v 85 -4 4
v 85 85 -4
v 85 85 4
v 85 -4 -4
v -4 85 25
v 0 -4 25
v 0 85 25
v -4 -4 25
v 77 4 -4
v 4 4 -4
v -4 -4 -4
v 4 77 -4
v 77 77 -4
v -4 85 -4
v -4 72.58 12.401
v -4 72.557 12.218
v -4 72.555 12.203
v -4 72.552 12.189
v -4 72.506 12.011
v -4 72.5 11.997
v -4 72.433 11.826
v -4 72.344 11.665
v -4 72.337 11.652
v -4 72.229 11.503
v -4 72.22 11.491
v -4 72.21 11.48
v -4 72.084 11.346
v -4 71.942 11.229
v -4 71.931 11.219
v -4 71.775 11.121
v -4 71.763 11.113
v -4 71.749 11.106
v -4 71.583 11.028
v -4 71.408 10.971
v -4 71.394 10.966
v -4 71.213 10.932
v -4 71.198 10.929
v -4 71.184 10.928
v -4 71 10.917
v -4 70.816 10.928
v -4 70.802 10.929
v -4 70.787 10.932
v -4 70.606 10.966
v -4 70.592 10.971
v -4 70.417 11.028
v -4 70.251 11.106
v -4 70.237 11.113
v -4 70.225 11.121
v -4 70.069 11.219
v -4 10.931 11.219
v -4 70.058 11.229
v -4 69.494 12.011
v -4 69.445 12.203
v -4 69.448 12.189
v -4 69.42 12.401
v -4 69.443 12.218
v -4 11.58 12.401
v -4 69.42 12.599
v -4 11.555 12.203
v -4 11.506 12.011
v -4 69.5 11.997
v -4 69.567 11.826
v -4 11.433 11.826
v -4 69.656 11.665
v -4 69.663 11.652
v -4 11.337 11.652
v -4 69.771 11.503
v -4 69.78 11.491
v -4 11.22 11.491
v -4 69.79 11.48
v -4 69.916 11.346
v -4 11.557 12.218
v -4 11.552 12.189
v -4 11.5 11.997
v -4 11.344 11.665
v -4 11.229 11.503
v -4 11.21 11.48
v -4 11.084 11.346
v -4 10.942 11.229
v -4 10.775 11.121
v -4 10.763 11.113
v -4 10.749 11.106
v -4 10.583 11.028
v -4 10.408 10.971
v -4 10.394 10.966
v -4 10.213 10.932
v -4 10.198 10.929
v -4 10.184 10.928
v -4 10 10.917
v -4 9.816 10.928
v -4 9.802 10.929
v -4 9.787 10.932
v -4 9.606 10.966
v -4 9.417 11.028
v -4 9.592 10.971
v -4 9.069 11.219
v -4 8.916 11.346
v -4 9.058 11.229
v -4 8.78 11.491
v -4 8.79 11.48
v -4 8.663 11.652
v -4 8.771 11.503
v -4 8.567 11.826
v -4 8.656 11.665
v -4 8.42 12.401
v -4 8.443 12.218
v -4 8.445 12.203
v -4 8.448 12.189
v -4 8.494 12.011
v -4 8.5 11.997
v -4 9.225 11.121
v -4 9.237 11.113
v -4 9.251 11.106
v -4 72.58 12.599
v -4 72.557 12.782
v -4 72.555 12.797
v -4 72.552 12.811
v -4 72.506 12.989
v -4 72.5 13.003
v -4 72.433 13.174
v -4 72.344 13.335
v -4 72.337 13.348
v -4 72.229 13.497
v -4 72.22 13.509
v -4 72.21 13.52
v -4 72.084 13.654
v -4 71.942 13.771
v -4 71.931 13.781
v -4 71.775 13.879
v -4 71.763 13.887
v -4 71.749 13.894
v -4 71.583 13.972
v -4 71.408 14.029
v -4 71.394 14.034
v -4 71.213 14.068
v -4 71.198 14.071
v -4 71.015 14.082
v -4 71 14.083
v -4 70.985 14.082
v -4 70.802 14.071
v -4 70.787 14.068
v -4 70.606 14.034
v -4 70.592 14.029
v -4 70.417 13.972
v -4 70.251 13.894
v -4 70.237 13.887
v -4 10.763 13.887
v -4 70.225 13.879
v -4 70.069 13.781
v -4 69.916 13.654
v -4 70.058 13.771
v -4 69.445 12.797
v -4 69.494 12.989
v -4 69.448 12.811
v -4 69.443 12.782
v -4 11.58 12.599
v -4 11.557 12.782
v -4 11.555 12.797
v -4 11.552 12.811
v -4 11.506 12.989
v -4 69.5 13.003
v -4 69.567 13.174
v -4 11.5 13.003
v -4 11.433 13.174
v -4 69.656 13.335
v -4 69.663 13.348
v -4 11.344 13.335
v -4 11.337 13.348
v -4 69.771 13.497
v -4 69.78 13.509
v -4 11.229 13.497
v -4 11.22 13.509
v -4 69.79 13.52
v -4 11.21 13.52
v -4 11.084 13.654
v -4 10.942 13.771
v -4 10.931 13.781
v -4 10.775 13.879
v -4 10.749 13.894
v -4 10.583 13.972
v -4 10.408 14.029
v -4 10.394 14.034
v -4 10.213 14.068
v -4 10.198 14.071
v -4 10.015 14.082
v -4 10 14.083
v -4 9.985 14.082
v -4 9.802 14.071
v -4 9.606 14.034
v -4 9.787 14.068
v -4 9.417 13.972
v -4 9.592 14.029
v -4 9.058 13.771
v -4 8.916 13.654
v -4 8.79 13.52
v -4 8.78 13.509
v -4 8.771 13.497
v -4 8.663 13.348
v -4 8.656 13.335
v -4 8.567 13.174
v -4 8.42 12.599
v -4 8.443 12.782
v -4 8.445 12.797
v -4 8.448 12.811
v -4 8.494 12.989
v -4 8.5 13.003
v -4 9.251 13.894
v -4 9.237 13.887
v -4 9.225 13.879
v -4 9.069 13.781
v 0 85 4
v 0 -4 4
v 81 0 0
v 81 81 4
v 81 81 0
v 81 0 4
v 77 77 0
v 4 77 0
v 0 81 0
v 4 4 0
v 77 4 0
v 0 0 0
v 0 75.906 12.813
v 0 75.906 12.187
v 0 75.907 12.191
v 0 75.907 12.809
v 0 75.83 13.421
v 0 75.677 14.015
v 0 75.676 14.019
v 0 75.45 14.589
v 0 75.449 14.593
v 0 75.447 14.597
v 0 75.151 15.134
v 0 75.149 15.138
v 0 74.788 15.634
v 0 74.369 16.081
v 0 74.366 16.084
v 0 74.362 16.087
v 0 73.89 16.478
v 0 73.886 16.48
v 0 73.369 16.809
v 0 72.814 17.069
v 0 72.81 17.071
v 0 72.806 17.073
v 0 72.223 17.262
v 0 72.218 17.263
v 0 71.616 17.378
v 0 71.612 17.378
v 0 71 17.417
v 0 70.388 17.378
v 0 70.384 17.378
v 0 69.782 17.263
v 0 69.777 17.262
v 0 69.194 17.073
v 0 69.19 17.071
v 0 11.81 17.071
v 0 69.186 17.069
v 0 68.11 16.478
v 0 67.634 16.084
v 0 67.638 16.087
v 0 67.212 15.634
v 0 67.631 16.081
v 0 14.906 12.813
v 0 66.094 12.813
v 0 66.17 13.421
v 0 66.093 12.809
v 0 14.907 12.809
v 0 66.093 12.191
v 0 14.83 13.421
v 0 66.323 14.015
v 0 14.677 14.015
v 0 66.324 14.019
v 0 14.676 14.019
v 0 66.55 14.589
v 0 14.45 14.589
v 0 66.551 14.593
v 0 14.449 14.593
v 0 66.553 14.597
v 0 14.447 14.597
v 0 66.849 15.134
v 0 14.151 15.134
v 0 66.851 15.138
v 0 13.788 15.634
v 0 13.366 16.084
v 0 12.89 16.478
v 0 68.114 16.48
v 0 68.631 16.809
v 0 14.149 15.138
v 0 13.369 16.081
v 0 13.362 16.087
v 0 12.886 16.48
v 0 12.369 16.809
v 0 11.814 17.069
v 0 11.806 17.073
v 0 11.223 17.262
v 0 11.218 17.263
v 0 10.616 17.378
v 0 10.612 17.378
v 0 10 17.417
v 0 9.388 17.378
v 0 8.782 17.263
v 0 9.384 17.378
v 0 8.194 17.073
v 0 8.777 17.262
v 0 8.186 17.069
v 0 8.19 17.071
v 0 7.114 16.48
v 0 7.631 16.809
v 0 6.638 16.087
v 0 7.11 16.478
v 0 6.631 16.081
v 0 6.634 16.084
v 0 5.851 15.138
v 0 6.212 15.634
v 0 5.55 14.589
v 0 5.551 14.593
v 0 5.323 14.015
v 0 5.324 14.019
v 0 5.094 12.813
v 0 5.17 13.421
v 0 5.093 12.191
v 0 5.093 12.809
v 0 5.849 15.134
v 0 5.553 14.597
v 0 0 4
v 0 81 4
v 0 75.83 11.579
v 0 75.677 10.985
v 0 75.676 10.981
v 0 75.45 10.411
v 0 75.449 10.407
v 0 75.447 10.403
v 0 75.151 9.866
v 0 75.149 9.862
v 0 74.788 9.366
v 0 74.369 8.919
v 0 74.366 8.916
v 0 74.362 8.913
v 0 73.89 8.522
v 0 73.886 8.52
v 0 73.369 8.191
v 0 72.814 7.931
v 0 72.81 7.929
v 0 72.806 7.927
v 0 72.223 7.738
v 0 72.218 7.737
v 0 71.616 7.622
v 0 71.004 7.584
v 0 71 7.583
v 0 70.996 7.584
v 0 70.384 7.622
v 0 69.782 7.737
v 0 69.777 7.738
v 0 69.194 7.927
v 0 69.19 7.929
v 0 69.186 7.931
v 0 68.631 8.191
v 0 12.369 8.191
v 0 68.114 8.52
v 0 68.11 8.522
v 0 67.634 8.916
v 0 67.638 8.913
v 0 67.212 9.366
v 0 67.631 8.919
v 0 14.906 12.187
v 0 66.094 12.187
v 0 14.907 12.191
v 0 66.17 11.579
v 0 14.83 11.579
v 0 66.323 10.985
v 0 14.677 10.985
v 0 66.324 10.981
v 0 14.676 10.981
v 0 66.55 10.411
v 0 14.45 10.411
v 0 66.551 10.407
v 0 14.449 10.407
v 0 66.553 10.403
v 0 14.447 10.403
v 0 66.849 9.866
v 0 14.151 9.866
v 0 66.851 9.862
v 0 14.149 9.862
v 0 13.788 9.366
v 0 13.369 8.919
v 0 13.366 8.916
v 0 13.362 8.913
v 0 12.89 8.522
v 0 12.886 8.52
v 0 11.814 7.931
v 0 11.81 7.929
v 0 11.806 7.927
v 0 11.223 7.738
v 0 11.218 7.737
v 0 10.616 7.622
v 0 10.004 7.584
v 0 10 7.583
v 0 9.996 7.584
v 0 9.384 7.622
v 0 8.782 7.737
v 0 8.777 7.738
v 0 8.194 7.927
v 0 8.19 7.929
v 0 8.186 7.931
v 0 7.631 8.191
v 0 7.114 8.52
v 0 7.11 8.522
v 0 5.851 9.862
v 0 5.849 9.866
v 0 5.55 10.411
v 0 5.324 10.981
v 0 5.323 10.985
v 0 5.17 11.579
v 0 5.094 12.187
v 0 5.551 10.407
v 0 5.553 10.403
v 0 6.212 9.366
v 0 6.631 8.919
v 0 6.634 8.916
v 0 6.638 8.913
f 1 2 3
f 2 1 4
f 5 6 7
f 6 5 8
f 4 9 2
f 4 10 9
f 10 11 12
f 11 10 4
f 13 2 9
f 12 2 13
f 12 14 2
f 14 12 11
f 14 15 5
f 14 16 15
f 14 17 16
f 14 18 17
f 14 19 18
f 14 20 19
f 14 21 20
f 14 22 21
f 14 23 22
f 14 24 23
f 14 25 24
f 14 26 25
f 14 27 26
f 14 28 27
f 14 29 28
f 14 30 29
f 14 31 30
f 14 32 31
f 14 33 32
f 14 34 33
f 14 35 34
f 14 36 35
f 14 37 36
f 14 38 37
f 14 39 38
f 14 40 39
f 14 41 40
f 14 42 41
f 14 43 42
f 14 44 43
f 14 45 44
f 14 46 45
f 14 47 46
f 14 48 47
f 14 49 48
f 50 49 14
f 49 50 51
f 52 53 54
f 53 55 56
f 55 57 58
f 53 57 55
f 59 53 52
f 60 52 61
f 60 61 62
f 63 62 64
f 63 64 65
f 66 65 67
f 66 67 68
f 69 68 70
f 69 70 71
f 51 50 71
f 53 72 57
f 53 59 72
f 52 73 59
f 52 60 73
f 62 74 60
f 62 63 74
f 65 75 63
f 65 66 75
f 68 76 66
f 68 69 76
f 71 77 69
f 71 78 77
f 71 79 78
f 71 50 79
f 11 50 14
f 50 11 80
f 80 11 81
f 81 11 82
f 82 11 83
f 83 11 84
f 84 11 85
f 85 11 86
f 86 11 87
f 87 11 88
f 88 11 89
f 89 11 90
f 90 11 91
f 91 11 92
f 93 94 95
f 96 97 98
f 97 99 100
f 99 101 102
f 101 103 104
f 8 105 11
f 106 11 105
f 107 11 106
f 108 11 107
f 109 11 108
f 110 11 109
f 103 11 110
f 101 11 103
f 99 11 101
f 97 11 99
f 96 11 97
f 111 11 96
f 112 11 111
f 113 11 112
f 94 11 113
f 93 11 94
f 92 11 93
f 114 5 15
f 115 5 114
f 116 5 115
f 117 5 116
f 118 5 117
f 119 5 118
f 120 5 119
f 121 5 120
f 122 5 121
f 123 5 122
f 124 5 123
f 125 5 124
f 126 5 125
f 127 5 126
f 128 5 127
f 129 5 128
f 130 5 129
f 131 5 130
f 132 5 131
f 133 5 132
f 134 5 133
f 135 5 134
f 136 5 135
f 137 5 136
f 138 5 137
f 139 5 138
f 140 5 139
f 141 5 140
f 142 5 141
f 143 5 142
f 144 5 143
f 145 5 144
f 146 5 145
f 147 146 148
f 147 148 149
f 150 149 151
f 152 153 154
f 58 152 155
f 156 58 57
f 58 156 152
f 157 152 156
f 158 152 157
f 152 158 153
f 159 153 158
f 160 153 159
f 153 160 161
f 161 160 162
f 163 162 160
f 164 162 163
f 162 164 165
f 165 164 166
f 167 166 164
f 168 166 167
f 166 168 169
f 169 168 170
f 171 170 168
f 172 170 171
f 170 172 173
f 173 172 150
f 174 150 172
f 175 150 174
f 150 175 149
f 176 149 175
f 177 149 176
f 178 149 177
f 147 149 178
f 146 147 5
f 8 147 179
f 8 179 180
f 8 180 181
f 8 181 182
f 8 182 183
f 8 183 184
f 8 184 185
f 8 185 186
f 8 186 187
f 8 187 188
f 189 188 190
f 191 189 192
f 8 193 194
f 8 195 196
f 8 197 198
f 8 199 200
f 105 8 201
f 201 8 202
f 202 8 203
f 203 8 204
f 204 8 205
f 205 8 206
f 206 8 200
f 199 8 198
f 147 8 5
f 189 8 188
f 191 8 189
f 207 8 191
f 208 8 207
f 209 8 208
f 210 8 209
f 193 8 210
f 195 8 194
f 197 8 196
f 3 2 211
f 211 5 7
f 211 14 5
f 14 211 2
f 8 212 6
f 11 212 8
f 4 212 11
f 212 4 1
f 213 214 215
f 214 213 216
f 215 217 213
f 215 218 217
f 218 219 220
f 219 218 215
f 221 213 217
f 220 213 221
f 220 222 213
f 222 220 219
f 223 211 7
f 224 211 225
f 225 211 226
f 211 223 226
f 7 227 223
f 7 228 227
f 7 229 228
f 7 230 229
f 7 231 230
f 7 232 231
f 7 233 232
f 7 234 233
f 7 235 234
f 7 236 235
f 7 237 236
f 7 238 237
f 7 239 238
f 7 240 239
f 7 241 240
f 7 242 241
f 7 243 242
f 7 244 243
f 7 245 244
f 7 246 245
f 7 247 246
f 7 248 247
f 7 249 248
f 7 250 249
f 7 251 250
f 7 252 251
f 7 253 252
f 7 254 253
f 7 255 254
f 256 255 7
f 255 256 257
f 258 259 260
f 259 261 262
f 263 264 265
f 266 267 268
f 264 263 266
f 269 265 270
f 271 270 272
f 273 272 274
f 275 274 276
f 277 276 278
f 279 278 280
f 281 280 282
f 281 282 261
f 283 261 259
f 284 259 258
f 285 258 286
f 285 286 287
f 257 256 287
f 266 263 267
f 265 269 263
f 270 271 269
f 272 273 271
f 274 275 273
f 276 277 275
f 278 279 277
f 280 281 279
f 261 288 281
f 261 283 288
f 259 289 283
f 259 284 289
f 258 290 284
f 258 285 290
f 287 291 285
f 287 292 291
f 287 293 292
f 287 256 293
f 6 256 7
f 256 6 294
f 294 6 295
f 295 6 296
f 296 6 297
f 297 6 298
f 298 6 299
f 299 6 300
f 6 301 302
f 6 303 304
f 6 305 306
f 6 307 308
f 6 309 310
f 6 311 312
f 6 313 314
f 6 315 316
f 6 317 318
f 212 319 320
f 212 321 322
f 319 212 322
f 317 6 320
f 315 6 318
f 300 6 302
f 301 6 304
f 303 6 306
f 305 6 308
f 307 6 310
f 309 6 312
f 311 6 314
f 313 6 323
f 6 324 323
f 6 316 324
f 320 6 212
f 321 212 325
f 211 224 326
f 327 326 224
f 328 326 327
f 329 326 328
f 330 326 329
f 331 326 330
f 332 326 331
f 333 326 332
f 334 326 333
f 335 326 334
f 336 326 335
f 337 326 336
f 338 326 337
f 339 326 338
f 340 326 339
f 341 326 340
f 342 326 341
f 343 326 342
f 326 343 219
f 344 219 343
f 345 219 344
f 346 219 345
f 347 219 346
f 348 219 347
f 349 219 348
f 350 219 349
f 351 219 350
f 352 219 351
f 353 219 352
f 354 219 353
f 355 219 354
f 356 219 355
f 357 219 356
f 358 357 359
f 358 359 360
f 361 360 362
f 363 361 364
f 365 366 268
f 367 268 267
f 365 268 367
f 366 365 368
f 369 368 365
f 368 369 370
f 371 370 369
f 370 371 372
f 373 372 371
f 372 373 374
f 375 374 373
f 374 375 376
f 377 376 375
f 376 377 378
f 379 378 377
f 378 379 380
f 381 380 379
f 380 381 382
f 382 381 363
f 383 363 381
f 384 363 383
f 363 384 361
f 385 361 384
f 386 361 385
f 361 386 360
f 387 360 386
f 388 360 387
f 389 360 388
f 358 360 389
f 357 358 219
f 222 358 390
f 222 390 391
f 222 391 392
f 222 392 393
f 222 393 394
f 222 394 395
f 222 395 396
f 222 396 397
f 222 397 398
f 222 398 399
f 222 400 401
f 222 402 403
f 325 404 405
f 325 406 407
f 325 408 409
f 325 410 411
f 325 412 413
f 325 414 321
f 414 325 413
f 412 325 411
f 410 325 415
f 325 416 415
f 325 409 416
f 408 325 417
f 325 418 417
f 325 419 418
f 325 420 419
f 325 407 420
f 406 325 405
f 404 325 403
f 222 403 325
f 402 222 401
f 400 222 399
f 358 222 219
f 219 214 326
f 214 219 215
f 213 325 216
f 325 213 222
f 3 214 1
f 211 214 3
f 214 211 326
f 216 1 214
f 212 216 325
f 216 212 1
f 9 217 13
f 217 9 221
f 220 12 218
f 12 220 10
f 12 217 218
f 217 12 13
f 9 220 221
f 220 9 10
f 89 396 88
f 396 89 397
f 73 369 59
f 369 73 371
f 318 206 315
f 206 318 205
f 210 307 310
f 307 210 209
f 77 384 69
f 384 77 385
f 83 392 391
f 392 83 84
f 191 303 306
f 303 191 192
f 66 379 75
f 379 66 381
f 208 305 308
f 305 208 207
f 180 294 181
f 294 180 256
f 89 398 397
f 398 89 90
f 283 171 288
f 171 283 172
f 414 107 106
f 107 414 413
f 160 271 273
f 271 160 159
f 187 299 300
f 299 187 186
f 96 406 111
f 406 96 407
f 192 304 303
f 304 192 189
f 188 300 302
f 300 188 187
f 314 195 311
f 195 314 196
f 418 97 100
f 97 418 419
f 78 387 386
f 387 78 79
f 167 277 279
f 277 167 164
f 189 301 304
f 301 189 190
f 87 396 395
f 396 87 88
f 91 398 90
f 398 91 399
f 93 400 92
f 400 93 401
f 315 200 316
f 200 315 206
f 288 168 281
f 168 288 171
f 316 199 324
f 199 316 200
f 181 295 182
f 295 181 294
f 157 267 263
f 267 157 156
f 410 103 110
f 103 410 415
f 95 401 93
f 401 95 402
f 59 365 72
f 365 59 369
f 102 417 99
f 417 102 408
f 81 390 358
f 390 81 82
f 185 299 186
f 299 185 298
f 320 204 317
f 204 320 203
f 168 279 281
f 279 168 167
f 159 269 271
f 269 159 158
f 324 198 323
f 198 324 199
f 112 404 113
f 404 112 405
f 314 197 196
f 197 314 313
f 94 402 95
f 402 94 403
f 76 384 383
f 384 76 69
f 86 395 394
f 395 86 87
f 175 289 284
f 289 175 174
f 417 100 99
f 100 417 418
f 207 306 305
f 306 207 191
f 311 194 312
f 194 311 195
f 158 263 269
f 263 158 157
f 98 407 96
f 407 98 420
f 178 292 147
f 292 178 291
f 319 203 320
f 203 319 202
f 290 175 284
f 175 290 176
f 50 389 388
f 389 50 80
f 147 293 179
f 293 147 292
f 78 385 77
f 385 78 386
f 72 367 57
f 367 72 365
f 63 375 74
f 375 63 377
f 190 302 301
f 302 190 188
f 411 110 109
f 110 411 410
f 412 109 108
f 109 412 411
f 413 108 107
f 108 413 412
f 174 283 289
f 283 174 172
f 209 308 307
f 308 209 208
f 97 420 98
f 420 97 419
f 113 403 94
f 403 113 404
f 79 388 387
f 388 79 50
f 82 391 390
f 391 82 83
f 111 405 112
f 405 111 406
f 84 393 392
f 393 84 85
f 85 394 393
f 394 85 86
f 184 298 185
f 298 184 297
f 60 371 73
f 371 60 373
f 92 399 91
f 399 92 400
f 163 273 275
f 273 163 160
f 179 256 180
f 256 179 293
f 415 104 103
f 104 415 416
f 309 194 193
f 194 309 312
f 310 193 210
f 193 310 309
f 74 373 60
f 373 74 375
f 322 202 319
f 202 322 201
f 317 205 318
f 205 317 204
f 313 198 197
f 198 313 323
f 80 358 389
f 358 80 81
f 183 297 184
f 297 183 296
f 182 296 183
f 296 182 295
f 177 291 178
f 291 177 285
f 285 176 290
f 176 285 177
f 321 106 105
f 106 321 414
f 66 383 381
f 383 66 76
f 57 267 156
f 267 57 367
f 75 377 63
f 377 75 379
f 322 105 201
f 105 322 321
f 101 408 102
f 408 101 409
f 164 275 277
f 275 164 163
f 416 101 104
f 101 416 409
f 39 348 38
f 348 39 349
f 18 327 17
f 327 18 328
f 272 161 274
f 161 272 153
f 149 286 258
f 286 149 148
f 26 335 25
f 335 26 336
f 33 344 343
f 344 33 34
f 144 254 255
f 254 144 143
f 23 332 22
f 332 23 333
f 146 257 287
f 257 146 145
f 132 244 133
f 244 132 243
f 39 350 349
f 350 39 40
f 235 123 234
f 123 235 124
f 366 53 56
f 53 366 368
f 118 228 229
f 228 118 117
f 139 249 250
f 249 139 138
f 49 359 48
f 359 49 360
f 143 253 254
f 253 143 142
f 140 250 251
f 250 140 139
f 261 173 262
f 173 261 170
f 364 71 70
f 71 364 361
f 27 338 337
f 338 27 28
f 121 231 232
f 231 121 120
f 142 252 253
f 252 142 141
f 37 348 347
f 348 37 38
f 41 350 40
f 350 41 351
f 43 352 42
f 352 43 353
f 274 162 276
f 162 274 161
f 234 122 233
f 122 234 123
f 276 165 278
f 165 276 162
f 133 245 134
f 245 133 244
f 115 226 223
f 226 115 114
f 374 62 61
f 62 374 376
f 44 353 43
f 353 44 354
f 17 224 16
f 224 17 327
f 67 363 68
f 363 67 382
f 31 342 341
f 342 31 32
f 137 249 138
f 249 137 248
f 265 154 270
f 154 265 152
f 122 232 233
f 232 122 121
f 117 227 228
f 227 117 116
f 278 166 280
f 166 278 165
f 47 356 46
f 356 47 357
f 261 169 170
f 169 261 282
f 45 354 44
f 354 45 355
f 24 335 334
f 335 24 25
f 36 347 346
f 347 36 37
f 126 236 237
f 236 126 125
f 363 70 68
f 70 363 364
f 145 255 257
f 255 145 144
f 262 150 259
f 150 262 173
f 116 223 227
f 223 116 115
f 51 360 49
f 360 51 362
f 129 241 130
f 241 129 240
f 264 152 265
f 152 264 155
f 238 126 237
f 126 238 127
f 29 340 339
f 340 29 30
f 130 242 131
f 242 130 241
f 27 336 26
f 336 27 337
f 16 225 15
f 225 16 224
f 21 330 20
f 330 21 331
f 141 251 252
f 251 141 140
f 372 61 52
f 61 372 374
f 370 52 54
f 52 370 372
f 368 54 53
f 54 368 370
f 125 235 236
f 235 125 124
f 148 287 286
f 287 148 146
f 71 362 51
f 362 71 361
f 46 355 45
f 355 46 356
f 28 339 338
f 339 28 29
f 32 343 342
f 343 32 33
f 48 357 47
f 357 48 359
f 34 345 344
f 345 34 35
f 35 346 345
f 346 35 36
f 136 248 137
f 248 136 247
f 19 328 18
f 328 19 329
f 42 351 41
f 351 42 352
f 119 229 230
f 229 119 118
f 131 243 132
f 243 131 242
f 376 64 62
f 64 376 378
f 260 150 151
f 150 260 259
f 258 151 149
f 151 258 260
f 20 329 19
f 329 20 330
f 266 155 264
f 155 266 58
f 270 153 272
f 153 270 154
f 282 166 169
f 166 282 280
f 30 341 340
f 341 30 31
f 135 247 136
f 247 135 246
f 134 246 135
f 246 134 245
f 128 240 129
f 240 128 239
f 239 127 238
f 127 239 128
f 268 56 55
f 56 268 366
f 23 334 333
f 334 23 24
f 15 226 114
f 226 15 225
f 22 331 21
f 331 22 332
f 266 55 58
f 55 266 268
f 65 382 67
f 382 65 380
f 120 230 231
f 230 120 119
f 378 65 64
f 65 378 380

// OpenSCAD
$width = 81;
$height = 25;
$depth = 81;
$border = 4;

$fn = 50;

difference() {
    translate([-$border,-$border,-$border]) cube([$depth+$border*2,$depth+$border*2,$height+$border]);
    cube([$depth,$width,$height]);
    translate([0,-$border-1,$border]) cube([$depth+$border*2,$width+$border*2+2,$height+$border*2]);
    translate([$border,$border,-$border-1]) cube([$depth-$border*2,$width-$border*2,$height-$border*2]);

    translate([-$border-0.1,10,$height/2]) rotate([0,90,0]) cylinder($border + 0.2,1.5,5);
    translate([-$border-0.1,$width-10,$height/2]) rotate([0,90,0]) cylinder($border + 0.2,1.5,5);

}
